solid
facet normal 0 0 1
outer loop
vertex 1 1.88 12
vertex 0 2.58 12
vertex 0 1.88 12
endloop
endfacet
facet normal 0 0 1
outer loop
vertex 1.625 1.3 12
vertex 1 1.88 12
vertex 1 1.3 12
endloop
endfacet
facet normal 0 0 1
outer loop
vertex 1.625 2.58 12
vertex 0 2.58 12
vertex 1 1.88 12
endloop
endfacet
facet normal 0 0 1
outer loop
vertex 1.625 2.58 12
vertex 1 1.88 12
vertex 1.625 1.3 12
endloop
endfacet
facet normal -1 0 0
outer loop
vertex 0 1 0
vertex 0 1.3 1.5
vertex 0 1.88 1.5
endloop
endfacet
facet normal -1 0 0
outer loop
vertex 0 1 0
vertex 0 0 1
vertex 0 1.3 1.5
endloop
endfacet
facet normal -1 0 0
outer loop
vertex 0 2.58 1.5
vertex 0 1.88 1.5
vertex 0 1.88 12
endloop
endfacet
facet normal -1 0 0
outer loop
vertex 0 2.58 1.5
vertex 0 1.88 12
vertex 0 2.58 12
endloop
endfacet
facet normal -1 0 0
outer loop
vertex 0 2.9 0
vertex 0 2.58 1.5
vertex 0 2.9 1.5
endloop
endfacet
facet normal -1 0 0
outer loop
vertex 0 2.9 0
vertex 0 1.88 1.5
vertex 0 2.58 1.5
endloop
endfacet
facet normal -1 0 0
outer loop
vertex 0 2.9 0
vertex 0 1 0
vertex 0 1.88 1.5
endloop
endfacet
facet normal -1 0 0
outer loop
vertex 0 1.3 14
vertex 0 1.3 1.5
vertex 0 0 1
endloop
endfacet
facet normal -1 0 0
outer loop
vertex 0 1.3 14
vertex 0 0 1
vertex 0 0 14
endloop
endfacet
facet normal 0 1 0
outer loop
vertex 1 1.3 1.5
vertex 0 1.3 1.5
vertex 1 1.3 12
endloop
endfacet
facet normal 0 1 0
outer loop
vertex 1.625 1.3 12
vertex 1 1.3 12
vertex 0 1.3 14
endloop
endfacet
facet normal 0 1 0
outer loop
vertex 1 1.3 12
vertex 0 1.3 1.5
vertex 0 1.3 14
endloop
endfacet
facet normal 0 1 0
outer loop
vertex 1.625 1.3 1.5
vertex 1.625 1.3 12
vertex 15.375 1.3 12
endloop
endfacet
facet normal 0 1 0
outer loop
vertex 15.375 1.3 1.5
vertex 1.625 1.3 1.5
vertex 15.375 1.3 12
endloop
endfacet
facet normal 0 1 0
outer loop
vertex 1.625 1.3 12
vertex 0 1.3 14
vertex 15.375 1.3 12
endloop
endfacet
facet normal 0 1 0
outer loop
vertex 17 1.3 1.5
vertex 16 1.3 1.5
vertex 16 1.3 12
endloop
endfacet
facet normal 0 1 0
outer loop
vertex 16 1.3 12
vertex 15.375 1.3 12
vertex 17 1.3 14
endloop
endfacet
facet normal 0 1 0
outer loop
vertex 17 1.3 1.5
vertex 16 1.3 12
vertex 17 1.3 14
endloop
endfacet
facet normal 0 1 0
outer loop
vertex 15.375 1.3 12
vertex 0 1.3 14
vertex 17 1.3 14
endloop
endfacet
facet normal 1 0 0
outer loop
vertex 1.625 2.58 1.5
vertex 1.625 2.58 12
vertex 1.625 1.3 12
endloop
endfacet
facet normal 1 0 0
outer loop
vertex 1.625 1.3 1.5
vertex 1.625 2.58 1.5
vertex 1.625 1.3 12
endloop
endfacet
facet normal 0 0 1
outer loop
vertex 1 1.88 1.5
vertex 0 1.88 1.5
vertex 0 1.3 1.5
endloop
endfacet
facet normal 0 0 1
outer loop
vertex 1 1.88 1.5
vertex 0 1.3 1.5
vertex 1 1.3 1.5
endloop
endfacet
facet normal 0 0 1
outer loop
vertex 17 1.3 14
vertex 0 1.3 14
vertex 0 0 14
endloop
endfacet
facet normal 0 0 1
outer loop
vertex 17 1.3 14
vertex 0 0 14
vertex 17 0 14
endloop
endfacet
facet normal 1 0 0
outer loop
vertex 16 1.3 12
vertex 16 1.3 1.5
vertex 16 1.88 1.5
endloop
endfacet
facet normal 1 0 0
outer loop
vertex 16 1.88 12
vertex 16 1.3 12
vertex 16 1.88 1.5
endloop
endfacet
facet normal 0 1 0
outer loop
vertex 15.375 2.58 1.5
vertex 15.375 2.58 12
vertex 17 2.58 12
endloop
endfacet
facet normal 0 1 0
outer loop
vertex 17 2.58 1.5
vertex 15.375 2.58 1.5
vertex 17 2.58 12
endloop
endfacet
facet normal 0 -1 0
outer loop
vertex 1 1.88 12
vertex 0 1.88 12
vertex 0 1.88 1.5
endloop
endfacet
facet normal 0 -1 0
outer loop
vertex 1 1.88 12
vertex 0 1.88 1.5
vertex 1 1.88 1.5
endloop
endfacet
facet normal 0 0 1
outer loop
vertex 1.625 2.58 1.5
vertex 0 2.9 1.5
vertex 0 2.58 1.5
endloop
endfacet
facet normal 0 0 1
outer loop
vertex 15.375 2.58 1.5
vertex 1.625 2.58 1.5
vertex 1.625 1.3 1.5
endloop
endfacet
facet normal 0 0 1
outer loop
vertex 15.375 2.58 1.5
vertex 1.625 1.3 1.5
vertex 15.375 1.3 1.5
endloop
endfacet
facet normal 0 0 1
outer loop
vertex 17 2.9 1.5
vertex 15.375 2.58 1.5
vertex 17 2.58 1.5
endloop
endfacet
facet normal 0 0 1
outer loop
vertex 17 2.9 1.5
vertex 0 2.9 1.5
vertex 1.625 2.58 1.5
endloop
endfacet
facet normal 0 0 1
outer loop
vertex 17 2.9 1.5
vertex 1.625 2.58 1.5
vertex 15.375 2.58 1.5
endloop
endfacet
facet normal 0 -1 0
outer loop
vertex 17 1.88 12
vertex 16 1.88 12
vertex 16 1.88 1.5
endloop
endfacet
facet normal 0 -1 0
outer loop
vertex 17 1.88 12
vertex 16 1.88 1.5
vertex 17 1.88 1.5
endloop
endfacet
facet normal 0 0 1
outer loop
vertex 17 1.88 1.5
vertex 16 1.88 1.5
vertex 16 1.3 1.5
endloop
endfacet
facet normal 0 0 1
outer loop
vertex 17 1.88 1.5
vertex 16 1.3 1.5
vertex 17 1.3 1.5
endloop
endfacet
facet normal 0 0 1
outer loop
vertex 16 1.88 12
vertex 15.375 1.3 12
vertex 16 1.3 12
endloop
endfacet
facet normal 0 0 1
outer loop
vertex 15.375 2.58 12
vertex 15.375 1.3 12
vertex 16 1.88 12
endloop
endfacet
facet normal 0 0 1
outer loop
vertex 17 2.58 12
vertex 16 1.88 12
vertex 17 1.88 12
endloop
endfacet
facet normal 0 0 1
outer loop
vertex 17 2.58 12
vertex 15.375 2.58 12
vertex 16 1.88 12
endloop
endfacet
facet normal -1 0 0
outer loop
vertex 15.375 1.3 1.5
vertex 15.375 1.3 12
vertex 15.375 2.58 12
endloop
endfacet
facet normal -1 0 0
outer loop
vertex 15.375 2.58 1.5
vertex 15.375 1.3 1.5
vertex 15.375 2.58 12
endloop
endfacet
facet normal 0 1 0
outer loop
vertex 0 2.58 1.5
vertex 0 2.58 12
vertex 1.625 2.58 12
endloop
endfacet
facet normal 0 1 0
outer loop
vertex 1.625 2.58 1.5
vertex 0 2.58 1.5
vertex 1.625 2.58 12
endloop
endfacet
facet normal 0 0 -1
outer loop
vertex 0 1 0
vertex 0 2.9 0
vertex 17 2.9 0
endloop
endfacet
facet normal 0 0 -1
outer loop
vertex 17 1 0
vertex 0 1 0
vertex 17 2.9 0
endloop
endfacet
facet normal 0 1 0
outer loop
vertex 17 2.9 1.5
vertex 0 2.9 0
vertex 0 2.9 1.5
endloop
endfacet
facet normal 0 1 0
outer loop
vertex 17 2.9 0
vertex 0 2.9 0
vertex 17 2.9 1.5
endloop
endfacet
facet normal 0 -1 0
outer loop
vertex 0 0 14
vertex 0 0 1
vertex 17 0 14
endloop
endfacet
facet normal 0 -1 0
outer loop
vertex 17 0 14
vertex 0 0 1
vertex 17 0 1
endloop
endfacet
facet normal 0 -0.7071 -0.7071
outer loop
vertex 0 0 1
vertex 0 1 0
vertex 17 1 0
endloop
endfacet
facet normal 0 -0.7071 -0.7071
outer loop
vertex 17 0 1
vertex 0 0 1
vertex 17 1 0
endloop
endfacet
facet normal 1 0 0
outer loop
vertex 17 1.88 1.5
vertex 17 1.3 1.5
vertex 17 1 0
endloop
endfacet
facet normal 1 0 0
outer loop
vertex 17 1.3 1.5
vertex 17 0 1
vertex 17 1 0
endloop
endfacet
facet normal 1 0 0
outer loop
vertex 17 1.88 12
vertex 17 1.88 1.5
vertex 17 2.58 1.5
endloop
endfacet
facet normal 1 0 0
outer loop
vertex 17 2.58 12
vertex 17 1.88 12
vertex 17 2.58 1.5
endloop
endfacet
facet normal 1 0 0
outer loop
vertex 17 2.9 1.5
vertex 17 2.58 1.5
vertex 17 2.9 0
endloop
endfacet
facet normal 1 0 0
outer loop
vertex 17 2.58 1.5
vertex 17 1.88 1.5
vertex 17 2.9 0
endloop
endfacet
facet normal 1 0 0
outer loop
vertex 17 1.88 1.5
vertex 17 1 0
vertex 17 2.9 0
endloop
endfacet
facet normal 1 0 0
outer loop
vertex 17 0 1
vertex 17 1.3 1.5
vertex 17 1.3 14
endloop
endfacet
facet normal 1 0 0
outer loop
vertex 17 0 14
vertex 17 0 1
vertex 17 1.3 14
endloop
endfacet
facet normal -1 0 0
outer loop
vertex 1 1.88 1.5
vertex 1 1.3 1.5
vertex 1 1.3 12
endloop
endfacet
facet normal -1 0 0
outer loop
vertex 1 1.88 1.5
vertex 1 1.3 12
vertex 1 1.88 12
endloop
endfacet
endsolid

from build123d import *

# Parameters (mm, degrees)
F0_W     = 17
F0_H     = 2.9
F1_DEPTH = 14
F2_W     = 1.625
F2_H     = 0.32
F2_W_2   = 1
F2_H_2   = 0.58
F3_DEPTH = 12.5
F4_W     = 17
F4_H     = 1.6
F5_DEPTH = 2
F6_SIZE  = 1


with BuildPart() as f1:
    # F0 (on Top) → F1 (new body)
    with BuildSketch(Plane.XY):
        with Locations((8.5, 1.45)):
            Rectangle(F0_W, F0_H)
    extrude(amount=F1_DEPTH)

    # F2 (on face) → F3 (cut)
    with BuildSketch(Plane.XY.offset(14)):
        Polygon((15.375, 2.9), (8.5, 2.9), (1.625, 2.9), (1.625, 2.58), (1.625, 1.3), (15.375, 1.3), (15.375, 2.58), align=None)
        with Locations((16.1875, 2.74)):
            Rectangle(F2_W, F2_H)
        with Locations((0.8125, 2.74)):
            Rectangle(F2_W, F2_H)
        with Locations((16.5, 1.59)):
            Rectangle(F2_W_2, F2_H_2)
        with Locations((0.5, 1.59)):
            Rectangle(F2_W_2, F2_H_2)
    extrude(amount=-F3_DEPTH, mode=Mode.SUBTRACT)

    # F4 (on face) → F5 (cut)
    with BuildSketch(Plane.XY.offset(14)):
        with Locations((8.5, 2.1)):
            Rectangle(F4_W, F4_H)
    extrude(amount=-F5_DEPTH, mode=Mode.SUBTRACT)

    # F6
    f6_edges = [f1.edges().sort_by_distance(p)[0] for p in [
        (8.5, 0, 0),
    ]]
    chamfer(f6_edges, length=F6_SIZE)


solid = f1.part
